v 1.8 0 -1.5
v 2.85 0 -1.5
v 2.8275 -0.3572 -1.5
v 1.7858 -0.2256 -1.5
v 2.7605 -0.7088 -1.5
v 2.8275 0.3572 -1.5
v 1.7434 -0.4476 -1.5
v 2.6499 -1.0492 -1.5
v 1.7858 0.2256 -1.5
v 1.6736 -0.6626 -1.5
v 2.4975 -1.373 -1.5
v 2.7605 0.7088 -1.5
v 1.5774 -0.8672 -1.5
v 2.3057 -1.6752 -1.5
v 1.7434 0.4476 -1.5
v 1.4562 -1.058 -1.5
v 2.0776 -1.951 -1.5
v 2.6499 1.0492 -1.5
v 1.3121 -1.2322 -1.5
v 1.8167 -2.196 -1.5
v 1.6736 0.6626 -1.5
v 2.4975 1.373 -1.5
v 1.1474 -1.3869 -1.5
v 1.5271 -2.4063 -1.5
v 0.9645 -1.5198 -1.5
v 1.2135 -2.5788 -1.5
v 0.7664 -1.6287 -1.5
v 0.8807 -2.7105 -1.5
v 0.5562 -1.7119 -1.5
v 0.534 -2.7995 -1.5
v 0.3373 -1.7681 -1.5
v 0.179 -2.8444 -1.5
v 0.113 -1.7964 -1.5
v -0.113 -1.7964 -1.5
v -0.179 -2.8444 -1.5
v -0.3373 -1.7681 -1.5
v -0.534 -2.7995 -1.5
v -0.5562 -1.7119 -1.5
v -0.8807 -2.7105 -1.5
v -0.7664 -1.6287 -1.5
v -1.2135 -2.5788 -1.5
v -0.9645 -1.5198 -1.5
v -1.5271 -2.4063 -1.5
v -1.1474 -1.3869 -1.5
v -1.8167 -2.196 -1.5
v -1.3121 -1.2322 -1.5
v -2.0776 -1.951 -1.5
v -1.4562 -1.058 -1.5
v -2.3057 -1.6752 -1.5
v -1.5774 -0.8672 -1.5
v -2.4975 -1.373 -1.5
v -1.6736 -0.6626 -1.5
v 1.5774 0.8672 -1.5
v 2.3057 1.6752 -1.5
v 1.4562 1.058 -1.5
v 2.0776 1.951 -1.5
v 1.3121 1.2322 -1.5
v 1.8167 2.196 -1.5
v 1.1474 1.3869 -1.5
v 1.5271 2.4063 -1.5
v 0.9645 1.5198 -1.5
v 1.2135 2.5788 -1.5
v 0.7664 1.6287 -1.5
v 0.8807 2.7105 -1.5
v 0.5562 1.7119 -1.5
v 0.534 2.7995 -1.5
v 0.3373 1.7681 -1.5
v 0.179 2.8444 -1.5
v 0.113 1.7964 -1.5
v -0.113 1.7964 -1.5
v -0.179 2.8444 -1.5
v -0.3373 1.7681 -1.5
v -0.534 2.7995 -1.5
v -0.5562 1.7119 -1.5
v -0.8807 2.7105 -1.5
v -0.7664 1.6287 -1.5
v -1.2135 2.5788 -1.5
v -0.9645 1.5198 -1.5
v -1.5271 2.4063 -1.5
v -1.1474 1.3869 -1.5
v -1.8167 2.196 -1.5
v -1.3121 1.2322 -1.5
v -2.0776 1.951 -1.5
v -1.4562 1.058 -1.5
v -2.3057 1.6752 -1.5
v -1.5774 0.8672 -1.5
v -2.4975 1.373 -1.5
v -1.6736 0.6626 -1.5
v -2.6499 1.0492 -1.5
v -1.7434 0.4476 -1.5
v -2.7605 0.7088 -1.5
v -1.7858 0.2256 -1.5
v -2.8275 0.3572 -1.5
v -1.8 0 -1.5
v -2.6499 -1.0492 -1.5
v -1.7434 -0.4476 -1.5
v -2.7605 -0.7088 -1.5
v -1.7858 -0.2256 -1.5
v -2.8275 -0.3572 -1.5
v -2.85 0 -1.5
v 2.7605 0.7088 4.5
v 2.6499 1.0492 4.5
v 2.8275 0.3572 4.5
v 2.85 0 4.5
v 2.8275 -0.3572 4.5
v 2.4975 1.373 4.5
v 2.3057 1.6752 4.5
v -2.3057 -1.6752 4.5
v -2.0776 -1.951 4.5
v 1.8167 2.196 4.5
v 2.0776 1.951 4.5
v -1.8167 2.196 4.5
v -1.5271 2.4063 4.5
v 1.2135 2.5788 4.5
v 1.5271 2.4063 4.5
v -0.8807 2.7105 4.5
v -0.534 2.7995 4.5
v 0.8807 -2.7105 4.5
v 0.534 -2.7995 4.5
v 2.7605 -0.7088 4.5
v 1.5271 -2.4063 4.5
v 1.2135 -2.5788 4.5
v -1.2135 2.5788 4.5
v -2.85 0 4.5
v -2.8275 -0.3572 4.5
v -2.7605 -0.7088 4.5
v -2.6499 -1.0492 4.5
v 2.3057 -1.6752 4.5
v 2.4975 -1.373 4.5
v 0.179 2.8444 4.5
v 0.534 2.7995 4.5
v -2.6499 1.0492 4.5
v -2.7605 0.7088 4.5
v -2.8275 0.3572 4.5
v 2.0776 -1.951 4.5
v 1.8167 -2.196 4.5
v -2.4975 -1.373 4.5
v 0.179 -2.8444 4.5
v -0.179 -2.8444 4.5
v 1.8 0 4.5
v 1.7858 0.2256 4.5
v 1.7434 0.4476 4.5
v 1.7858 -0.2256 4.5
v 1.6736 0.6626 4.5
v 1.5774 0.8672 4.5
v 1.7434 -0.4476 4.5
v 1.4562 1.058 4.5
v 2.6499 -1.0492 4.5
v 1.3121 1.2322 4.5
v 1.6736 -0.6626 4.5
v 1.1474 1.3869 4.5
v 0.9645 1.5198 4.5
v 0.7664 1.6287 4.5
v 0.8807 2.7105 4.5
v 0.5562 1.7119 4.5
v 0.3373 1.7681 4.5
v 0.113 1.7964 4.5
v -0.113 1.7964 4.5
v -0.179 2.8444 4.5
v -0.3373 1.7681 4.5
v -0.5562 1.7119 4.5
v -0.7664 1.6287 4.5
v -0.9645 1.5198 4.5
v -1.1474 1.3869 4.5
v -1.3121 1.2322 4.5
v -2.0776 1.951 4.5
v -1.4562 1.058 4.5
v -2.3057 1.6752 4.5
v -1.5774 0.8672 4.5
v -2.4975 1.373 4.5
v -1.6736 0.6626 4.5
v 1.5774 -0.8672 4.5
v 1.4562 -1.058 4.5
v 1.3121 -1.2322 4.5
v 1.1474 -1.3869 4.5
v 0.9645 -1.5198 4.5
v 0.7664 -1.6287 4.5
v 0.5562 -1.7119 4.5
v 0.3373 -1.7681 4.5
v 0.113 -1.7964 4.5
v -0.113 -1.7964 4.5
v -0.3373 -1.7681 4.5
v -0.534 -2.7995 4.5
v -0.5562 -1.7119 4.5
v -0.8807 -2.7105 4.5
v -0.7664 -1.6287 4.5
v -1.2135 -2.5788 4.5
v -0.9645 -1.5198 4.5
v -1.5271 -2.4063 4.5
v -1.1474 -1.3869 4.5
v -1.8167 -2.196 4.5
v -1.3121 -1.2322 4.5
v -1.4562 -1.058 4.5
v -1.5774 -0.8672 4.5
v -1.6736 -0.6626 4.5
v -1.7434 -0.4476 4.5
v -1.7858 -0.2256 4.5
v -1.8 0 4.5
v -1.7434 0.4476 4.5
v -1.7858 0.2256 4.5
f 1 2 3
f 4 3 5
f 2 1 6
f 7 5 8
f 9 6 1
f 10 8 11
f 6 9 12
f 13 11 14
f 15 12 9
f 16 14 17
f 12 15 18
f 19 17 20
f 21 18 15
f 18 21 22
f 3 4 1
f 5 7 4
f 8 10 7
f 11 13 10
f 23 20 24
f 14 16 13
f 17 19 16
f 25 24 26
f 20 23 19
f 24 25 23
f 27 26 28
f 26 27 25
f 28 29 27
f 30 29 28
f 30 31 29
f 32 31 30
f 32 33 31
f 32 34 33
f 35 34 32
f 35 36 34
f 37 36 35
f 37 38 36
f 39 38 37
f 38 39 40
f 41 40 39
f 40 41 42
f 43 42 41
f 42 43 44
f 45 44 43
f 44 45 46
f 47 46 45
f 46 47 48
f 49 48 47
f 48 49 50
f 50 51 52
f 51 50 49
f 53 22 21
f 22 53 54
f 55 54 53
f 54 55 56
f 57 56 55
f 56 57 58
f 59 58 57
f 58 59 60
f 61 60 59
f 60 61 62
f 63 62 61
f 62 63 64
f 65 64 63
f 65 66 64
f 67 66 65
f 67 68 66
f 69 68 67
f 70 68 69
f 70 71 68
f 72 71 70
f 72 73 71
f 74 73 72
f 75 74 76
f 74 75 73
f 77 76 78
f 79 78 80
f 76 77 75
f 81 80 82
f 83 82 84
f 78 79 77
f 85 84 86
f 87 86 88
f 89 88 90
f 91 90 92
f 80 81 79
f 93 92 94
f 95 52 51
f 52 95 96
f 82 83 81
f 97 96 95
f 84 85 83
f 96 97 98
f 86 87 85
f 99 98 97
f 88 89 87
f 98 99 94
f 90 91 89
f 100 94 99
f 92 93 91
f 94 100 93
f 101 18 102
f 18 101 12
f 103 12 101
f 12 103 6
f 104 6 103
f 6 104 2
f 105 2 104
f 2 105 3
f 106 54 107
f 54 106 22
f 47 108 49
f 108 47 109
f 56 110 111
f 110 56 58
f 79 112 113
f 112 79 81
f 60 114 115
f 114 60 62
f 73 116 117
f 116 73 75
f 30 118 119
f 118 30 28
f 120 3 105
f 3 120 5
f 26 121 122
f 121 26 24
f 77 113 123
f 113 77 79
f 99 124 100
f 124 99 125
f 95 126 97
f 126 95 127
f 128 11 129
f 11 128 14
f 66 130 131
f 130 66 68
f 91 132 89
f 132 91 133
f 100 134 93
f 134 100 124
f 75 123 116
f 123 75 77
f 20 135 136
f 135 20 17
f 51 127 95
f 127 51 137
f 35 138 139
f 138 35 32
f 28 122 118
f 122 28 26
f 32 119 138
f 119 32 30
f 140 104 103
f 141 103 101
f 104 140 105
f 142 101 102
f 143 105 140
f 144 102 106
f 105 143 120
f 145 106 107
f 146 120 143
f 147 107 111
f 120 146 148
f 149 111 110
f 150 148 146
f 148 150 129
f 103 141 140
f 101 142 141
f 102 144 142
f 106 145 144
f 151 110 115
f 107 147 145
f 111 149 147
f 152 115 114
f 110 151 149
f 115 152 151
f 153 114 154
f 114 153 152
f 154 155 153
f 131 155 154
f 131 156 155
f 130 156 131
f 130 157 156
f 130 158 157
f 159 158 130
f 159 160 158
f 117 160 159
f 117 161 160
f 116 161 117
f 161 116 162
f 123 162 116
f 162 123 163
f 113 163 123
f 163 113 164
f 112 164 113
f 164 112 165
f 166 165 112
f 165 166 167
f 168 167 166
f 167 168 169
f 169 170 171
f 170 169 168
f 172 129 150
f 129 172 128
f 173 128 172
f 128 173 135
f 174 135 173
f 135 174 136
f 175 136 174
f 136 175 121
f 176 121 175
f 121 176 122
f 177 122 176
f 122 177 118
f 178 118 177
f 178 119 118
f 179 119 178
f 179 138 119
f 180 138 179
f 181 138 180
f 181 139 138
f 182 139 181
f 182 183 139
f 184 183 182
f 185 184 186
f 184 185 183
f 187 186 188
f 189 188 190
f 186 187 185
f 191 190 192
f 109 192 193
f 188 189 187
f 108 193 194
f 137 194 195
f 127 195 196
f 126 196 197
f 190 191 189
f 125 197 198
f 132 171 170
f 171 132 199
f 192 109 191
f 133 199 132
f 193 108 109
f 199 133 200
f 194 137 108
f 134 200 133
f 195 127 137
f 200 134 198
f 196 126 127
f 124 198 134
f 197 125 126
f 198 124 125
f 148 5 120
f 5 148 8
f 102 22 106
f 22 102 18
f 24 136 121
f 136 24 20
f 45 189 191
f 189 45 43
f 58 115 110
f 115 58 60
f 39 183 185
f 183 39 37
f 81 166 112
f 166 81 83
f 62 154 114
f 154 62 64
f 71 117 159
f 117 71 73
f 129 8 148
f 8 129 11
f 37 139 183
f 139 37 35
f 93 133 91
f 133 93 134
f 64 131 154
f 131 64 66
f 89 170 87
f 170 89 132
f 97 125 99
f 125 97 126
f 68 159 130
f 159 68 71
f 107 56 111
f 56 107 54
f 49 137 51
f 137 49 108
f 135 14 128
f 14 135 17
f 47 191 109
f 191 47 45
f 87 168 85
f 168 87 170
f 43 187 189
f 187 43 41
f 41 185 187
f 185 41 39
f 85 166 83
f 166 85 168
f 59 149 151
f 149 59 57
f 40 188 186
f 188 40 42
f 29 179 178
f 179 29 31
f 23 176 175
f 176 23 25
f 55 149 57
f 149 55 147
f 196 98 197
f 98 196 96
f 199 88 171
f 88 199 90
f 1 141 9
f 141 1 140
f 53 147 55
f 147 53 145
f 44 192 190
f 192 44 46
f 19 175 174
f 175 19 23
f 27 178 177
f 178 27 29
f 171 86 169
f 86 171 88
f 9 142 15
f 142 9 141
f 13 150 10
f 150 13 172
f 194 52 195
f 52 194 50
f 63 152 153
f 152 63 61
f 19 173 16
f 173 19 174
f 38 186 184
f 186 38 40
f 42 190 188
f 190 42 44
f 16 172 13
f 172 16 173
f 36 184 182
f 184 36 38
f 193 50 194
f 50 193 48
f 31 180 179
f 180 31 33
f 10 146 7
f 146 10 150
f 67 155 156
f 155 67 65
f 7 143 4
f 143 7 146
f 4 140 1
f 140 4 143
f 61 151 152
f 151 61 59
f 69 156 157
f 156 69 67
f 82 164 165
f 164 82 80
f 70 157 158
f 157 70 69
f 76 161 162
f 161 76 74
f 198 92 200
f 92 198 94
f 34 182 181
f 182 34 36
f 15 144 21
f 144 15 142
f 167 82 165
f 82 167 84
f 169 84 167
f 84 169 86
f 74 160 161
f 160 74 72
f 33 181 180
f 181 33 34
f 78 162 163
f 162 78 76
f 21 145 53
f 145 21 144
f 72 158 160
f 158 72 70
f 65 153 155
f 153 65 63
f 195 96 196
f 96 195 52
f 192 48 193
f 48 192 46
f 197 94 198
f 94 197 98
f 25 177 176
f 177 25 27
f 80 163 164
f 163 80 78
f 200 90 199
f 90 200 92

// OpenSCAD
$fn = 50;


difference() {
	union() {
		translate(v = [0, 0, -1.5000000000]) {
			cylinder(h = 3, r = 1.0000000000);
		}
		translate(v = [0, 0, -1.5000000000]) {
			cylinder(h = 6, r = 2.8500000000);
		}
	}
	union() {
		translate(v = [0, 0, -100.0000000000]) {
			cylinder(h = 200, r = 1.8000000000);
		}
	}
}
